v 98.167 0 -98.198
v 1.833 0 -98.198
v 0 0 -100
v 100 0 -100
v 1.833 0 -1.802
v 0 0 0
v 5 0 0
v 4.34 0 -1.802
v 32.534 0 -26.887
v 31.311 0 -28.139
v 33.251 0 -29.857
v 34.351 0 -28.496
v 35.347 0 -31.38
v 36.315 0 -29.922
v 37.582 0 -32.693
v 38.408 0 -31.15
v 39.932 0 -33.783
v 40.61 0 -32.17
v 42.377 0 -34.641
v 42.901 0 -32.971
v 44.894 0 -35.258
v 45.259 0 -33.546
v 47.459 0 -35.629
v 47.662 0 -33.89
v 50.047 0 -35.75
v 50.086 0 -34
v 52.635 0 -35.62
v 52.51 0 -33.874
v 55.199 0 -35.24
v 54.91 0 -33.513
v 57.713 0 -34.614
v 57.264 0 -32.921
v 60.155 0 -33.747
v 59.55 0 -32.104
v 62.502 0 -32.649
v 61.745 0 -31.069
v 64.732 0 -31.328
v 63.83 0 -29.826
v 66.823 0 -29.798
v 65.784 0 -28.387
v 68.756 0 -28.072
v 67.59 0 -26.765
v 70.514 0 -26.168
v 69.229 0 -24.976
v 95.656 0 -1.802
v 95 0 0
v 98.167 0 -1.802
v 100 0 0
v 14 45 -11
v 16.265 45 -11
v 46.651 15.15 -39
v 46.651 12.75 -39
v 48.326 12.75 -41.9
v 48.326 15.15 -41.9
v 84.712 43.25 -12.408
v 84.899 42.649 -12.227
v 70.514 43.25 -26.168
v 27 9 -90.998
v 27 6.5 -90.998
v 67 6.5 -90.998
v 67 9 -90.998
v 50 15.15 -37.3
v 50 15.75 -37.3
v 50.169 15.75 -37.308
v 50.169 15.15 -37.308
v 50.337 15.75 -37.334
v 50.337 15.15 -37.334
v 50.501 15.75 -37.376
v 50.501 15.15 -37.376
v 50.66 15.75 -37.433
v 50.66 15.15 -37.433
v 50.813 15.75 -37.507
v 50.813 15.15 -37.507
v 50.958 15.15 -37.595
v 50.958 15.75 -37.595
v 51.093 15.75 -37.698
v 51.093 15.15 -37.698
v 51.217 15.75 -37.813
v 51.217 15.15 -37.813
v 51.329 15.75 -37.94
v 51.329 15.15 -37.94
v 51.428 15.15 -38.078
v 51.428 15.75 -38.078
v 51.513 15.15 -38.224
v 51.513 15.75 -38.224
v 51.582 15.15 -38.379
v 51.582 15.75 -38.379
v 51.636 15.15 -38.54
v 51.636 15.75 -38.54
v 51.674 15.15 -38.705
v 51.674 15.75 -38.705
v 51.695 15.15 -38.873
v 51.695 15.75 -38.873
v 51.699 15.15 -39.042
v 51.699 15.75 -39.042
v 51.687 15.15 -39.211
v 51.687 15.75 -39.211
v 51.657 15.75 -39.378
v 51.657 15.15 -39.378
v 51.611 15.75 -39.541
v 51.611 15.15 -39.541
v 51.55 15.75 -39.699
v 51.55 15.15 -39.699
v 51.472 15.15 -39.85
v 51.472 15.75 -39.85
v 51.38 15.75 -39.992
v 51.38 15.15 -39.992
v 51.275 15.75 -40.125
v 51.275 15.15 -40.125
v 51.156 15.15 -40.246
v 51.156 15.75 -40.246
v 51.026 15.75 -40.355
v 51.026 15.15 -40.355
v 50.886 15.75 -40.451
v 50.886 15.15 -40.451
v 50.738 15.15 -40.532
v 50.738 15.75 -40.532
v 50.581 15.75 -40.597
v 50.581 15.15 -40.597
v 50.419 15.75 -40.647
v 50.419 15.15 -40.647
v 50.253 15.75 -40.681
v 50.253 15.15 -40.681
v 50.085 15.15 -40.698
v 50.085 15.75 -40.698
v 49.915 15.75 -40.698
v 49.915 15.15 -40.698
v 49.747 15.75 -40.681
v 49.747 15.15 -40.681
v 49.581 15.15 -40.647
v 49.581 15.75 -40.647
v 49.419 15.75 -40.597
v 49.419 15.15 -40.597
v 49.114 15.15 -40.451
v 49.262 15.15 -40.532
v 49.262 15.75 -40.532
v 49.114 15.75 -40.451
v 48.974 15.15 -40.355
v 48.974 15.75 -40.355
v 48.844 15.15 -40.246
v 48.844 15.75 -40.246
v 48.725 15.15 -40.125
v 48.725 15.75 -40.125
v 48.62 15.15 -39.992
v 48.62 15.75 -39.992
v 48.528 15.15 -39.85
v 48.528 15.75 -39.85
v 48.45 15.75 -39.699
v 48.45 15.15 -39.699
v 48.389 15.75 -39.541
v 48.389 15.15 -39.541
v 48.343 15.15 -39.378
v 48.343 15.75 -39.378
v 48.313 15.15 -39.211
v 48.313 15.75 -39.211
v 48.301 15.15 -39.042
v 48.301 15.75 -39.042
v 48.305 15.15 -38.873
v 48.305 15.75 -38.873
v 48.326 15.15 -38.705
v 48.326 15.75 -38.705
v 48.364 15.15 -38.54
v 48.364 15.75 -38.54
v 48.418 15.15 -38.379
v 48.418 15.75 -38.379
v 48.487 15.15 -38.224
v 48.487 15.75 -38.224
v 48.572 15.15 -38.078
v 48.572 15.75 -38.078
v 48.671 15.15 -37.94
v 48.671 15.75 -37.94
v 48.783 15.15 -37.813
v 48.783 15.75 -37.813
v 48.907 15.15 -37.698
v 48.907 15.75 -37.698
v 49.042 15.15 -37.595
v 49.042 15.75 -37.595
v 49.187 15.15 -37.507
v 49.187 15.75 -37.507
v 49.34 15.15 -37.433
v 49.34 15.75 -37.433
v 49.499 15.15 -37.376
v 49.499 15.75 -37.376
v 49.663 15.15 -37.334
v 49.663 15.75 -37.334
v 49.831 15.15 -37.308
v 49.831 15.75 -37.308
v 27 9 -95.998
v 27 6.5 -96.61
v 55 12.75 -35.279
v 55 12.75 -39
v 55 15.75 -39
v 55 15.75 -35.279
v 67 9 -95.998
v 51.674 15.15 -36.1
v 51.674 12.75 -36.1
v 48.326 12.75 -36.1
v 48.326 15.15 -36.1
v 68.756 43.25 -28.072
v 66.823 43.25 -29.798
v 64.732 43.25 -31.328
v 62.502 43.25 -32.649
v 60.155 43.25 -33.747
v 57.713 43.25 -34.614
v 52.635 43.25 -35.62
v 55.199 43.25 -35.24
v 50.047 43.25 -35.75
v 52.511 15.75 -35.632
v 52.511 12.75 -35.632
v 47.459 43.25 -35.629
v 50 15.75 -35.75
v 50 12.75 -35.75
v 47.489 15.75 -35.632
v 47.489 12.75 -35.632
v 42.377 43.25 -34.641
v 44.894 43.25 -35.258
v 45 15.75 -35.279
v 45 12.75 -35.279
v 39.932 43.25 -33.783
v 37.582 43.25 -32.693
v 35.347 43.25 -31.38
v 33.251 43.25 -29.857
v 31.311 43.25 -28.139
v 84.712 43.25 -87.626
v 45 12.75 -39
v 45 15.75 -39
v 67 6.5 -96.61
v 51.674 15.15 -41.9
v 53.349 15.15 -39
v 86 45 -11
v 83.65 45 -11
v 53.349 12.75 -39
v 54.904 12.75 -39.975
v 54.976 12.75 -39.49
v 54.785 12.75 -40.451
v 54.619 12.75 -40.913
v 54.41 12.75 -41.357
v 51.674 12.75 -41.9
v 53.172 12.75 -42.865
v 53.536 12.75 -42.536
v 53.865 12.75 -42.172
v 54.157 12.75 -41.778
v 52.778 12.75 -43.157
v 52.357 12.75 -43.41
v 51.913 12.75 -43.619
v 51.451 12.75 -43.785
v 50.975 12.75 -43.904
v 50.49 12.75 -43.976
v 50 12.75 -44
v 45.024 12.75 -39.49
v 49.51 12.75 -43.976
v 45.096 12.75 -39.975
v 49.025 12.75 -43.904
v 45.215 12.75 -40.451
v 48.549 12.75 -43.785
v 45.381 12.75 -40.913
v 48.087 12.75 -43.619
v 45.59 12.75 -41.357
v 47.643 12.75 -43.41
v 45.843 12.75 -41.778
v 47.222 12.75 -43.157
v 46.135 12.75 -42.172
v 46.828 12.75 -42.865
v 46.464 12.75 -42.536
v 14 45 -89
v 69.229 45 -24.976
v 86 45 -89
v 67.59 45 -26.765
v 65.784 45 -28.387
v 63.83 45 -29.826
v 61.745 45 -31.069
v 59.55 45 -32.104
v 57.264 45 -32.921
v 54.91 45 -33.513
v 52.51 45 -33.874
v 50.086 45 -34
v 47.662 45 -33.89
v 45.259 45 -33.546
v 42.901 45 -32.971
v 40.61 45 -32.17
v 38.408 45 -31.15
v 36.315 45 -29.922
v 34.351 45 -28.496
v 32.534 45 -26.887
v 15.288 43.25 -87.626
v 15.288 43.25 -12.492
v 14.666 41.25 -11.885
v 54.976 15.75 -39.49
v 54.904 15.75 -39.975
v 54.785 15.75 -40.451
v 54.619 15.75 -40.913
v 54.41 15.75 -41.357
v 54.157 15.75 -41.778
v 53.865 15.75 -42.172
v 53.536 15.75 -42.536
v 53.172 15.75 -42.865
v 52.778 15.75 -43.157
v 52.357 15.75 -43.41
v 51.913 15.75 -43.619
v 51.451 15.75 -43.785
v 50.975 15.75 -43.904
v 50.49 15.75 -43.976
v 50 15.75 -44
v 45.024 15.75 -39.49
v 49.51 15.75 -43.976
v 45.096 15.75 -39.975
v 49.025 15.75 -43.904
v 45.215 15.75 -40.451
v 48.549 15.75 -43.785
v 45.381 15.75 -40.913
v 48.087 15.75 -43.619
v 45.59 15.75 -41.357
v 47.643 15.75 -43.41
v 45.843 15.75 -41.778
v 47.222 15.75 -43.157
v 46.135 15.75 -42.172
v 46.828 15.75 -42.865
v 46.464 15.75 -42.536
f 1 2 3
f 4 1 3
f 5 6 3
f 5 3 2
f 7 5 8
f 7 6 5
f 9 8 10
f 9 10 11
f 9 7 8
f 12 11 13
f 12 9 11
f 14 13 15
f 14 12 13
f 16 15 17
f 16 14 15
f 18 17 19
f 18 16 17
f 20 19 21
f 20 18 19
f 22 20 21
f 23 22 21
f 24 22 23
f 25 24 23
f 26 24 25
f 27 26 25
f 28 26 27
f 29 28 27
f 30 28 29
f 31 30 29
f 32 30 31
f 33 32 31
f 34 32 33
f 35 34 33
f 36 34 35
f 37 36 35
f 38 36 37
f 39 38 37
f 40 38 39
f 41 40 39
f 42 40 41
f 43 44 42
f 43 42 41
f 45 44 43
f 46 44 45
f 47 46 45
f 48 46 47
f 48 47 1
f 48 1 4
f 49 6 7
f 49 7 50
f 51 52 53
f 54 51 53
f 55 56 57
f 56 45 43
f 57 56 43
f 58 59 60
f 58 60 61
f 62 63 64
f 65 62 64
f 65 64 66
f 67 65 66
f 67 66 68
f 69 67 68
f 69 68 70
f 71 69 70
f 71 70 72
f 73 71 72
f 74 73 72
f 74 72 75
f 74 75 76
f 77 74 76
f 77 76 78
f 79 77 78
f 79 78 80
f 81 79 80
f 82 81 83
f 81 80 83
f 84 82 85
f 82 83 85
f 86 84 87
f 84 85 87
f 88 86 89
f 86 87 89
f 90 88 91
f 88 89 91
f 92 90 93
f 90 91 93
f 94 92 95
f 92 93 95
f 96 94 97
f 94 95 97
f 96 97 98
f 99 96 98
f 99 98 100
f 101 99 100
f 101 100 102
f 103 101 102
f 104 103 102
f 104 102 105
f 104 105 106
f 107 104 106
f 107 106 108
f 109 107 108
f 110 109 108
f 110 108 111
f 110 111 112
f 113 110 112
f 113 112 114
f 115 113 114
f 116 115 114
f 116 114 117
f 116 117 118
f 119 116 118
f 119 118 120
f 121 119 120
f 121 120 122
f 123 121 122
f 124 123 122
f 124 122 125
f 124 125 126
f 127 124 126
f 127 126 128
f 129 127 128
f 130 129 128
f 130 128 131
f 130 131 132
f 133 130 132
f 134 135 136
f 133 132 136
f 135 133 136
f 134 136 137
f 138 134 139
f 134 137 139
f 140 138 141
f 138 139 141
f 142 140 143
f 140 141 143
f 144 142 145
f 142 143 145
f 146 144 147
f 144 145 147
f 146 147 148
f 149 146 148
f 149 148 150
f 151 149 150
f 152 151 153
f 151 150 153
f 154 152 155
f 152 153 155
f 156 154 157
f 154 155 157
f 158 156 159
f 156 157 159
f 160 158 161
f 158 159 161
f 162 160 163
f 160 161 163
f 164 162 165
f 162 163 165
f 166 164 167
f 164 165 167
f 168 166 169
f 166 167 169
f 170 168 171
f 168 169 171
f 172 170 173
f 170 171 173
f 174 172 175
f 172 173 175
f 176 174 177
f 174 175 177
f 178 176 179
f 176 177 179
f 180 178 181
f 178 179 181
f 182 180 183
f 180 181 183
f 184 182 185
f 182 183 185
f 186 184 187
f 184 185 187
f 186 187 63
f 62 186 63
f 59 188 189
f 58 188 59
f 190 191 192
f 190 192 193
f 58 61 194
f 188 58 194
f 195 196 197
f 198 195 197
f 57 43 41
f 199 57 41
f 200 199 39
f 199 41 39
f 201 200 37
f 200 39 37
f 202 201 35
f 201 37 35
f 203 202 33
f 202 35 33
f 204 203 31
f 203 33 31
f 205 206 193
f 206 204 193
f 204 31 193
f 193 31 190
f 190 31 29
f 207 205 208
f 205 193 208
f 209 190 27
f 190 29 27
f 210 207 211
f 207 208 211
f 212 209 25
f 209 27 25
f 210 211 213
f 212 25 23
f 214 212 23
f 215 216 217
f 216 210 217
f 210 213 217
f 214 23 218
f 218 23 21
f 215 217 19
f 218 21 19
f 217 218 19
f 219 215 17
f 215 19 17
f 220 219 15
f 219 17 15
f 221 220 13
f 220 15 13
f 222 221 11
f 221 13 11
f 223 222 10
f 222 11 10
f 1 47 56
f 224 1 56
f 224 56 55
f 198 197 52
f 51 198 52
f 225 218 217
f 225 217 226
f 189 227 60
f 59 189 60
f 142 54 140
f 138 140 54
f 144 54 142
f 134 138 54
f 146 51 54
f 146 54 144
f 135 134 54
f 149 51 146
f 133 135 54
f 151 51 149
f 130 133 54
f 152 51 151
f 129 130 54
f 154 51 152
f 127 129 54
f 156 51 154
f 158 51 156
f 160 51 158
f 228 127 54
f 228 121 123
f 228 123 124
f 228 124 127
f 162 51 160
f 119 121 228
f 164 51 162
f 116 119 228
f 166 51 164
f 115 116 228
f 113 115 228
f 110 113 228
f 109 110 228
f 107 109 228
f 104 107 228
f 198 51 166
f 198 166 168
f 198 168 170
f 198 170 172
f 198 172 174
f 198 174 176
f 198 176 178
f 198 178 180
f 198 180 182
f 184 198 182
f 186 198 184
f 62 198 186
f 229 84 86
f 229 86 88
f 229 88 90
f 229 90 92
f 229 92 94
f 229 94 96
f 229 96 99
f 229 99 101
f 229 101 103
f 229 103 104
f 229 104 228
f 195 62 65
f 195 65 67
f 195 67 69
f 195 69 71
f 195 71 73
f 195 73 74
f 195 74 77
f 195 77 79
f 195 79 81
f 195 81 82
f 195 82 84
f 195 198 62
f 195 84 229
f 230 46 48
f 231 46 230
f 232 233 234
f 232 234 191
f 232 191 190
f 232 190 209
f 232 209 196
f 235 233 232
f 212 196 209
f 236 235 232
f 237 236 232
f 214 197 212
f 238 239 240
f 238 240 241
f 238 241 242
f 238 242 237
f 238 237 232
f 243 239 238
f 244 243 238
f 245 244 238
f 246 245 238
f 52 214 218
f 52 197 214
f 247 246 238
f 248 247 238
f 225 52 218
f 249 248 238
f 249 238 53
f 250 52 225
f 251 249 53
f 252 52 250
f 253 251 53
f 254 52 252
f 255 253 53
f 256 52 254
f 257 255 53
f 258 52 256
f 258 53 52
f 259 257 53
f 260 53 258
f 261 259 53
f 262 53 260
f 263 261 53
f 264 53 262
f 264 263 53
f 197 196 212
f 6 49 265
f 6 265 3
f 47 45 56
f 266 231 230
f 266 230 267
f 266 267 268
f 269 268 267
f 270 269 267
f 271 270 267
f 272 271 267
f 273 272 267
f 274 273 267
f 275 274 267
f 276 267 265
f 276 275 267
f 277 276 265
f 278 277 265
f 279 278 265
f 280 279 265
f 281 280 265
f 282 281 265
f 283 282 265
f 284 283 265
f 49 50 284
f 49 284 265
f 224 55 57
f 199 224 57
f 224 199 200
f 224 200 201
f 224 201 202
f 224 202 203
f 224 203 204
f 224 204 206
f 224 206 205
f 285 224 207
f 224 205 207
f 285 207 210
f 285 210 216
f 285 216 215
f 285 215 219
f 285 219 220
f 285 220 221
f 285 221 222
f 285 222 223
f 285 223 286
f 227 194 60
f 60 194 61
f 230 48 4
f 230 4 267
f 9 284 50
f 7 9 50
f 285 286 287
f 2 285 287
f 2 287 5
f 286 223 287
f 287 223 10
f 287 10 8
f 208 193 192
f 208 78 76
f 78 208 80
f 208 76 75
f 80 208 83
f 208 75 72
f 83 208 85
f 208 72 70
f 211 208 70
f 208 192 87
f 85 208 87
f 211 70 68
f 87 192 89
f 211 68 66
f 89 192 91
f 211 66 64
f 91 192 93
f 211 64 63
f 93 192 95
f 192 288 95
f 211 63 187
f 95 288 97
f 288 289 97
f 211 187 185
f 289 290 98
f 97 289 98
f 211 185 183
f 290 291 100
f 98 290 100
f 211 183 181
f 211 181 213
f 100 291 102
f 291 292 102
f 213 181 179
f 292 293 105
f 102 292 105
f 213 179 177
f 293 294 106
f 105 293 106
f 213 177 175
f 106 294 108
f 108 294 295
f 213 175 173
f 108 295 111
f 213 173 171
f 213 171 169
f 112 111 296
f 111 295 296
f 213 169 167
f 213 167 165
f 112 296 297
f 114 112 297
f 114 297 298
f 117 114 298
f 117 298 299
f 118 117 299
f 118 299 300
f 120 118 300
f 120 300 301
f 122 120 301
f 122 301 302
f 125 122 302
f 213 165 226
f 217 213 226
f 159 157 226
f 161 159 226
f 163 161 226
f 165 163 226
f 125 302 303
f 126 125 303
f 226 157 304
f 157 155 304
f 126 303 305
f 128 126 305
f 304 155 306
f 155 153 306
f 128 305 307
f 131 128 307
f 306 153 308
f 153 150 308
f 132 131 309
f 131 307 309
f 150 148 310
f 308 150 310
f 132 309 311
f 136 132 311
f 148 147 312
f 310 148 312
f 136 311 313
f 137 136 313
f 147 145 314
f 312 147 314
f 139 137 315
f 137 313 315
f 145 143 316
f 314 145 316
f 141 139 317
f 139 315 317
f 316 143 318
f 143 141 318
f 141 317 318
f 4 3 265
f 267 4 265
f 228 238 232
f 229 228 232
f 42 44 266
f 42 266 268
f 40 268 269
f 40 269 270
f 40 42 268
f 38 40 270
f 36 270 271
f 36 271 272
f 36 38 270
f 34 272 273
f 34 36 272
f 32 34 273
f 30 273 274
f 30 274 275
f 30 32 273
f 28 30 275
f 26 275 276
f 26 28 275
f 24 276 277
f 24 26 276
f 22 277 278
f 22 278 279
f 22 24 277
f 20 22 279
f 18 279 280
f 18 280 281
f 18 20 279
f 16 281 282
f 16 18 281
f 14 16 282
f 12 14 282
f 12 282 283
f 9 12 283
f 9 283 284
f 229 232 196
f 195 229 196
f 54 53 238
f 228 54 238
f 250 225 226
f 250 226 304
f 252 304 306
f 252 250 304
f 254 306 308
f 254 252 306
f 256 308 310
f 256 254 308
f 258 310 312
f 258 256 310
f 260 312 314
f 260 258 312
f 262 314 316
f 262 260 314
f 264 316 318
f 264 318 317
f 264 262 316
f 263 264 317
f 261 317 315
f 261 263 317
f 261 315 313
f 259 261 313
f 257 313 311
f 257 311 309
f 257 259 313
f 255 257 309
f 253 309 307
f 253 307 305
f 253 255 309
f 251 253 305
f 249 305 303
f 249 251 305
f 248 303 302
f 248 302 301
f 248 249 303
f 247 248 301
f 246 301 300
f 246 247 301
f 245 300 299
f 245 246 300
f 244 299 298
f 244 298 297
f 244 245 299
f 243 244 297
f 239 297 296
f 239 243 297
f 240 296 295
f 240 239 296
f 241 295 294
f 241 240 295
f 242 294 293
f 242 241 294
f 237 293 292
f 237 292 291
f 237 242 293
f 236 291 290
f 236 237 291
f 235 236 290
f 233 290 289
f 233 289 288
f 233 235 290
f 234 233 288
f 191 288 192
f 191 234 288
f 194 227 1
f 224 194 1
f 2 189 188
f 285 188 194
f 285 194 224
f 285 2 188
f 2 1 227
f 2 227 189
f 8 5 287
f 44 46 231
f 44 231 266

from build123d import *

# Parameters (mm, degrees)
GRUNDK_RPER_DEPTH               = 100
SCHRAEGEN_VORNE_DEPTH           = 100
SCHNITT_LINEAR_AUSTRAGEN4_DEPTH = 45
WANDUNG1_T                      = -1.75
AUFSATZ_LINEAR_AUSTRAGEN1_DEPTH = 40
AUFSATZ_LINEAR_AUSTRAGEN3_DEPTH = 3
SCHNITT_LINEAR_AUSTRAGEN6_DEPTH = 2.4
SKIZZE13_R                      = 1.7
SCHNITT_LINEAR_AUSTRAGEN7_DEPTH = 2.4


with BuildPart() as part:
    # Skizze1 → Grundkörper (new body)
    with BuildSketch(Plane.XY):
        Polygon((0, 0), (100, 0), (86, 45), (14, 45), align=None)
    extrude(amount=-GRUNDK_RPER_DEPTH)

    # Skizze2 → Schraegen_vorne (cut)
    with BuildSketch(Plane(origin=(0, 0, 0), x_dir=(0, 0, -1), z_dir=(1, 0, 0))):
        Polygon((100, 0), (89, 45), (100, 45), align=None)
    schraegen_vorne = extrude(amount=SCHRAEGEN_VORNE_DEPTH, mode=Mode.SUBTRACT)

    # Spiegel_Schraege_hinten: Schraegen_vorne across plane
    add(schraegen_vorne.mirror(Plane.XY.offset(-50)), mode=Mode.SUBTRACT)

    # Skizze4 → Schnitt-Linear austragen4 (cut)
    with BuildSketch(Plane.XZ):
        with BuildLine():
            Line((5, 0), (95, 0))
            Line((95, 0), (69.229297103, -24.976048727))
            ThreePointArc((69.229297103, -24.976048727), (51.299881289, -33.966183301), (32.533786025, -26.886625433))
            Line((32.533786025, -26.886625433), (5, 0))
        make_face()
    extrude(amount=-SCHNITT_LINEAR_AUSTRAGEN4_DEPTH, mode=Mode.SUBTRACT)

    # Wandung1
    wandung1_openings = [part.faces().sort_by_distance(p)[0] for p in [
        (50.008556747, 0, -58.352640724),
    ]]
    offset(amount=WANDUNG1_T, openings=wandung1_openings, kind=Kind.INTERSECTION)

    # Skizze5 → Aufsatz-Linear austragen1 (add)
    with BuildSketch(Plane.ZY.offset(-27)):
        Polygon((-90.998474583, 9), (-95.998474583, 9), (-96.609585694, 6.5), (-90.998474583, 6.5), align=None)
    extrude(amount=-AUFSATZ_LINEAR_AUSTRAGEN1_DEPTH)

    # Skizze10 → Aufsatz-Linear austragen3 (add)
    with BuildSketch(Plane(origin=(0, 12.75, 0), x_dir=(-1, 0, 0), z_dir=(0, -1, 0))):
        with BuildLine():
            Line((-45, 35.278555896), (-45, 38.999999059))
            ThreePointArc((-45, 38.999999059), (-49.999999529, 44), (-55, 39))
            Line((-55, 39), (-55, 35.278555896))
            ThreePointArc((-55, 35.278555896), (-50, 35.75), (-45, 35.278555896))
        make_face()
    extrude(amount=-AUFSATZ_LINEAR_AUSTRAGEN3_DEPTH)

    # Skizze12 → Schnitt-Linear austragen6 (cut)
    with BuildSketch(Plane.XZ.offset(-12.75)):
        Polygon((46.651368439, -39), (48.325684219, -41.9), (51.674315781, -41.9), (53.348631561, -39), (51.674315781, -36.1), (48.325684219, -36.1), align=None)
    extrude(amount=-SCHNITT_LINEAR_AUSTRAGEN6_DEPTH, mode=Mode.SUBTRACT)

    # Skizze13 → Schnitt-Linear austragen7 (cut)
    with BuildSketch(Plane(origin=(0, 15.75, 0), x_dir=(1, 0, 0), z_dir=(0, 1, 0))):
        with Locations(Location((50, 39, 0), (0, 0, 270))):
            Circle(SKIZZE13_R)
    extrude(amount=-SCHNITT_LINEAR_AUSTRAGEN7_DEPTH, mode=Mode.SUBTRACT)


solid = part.part
